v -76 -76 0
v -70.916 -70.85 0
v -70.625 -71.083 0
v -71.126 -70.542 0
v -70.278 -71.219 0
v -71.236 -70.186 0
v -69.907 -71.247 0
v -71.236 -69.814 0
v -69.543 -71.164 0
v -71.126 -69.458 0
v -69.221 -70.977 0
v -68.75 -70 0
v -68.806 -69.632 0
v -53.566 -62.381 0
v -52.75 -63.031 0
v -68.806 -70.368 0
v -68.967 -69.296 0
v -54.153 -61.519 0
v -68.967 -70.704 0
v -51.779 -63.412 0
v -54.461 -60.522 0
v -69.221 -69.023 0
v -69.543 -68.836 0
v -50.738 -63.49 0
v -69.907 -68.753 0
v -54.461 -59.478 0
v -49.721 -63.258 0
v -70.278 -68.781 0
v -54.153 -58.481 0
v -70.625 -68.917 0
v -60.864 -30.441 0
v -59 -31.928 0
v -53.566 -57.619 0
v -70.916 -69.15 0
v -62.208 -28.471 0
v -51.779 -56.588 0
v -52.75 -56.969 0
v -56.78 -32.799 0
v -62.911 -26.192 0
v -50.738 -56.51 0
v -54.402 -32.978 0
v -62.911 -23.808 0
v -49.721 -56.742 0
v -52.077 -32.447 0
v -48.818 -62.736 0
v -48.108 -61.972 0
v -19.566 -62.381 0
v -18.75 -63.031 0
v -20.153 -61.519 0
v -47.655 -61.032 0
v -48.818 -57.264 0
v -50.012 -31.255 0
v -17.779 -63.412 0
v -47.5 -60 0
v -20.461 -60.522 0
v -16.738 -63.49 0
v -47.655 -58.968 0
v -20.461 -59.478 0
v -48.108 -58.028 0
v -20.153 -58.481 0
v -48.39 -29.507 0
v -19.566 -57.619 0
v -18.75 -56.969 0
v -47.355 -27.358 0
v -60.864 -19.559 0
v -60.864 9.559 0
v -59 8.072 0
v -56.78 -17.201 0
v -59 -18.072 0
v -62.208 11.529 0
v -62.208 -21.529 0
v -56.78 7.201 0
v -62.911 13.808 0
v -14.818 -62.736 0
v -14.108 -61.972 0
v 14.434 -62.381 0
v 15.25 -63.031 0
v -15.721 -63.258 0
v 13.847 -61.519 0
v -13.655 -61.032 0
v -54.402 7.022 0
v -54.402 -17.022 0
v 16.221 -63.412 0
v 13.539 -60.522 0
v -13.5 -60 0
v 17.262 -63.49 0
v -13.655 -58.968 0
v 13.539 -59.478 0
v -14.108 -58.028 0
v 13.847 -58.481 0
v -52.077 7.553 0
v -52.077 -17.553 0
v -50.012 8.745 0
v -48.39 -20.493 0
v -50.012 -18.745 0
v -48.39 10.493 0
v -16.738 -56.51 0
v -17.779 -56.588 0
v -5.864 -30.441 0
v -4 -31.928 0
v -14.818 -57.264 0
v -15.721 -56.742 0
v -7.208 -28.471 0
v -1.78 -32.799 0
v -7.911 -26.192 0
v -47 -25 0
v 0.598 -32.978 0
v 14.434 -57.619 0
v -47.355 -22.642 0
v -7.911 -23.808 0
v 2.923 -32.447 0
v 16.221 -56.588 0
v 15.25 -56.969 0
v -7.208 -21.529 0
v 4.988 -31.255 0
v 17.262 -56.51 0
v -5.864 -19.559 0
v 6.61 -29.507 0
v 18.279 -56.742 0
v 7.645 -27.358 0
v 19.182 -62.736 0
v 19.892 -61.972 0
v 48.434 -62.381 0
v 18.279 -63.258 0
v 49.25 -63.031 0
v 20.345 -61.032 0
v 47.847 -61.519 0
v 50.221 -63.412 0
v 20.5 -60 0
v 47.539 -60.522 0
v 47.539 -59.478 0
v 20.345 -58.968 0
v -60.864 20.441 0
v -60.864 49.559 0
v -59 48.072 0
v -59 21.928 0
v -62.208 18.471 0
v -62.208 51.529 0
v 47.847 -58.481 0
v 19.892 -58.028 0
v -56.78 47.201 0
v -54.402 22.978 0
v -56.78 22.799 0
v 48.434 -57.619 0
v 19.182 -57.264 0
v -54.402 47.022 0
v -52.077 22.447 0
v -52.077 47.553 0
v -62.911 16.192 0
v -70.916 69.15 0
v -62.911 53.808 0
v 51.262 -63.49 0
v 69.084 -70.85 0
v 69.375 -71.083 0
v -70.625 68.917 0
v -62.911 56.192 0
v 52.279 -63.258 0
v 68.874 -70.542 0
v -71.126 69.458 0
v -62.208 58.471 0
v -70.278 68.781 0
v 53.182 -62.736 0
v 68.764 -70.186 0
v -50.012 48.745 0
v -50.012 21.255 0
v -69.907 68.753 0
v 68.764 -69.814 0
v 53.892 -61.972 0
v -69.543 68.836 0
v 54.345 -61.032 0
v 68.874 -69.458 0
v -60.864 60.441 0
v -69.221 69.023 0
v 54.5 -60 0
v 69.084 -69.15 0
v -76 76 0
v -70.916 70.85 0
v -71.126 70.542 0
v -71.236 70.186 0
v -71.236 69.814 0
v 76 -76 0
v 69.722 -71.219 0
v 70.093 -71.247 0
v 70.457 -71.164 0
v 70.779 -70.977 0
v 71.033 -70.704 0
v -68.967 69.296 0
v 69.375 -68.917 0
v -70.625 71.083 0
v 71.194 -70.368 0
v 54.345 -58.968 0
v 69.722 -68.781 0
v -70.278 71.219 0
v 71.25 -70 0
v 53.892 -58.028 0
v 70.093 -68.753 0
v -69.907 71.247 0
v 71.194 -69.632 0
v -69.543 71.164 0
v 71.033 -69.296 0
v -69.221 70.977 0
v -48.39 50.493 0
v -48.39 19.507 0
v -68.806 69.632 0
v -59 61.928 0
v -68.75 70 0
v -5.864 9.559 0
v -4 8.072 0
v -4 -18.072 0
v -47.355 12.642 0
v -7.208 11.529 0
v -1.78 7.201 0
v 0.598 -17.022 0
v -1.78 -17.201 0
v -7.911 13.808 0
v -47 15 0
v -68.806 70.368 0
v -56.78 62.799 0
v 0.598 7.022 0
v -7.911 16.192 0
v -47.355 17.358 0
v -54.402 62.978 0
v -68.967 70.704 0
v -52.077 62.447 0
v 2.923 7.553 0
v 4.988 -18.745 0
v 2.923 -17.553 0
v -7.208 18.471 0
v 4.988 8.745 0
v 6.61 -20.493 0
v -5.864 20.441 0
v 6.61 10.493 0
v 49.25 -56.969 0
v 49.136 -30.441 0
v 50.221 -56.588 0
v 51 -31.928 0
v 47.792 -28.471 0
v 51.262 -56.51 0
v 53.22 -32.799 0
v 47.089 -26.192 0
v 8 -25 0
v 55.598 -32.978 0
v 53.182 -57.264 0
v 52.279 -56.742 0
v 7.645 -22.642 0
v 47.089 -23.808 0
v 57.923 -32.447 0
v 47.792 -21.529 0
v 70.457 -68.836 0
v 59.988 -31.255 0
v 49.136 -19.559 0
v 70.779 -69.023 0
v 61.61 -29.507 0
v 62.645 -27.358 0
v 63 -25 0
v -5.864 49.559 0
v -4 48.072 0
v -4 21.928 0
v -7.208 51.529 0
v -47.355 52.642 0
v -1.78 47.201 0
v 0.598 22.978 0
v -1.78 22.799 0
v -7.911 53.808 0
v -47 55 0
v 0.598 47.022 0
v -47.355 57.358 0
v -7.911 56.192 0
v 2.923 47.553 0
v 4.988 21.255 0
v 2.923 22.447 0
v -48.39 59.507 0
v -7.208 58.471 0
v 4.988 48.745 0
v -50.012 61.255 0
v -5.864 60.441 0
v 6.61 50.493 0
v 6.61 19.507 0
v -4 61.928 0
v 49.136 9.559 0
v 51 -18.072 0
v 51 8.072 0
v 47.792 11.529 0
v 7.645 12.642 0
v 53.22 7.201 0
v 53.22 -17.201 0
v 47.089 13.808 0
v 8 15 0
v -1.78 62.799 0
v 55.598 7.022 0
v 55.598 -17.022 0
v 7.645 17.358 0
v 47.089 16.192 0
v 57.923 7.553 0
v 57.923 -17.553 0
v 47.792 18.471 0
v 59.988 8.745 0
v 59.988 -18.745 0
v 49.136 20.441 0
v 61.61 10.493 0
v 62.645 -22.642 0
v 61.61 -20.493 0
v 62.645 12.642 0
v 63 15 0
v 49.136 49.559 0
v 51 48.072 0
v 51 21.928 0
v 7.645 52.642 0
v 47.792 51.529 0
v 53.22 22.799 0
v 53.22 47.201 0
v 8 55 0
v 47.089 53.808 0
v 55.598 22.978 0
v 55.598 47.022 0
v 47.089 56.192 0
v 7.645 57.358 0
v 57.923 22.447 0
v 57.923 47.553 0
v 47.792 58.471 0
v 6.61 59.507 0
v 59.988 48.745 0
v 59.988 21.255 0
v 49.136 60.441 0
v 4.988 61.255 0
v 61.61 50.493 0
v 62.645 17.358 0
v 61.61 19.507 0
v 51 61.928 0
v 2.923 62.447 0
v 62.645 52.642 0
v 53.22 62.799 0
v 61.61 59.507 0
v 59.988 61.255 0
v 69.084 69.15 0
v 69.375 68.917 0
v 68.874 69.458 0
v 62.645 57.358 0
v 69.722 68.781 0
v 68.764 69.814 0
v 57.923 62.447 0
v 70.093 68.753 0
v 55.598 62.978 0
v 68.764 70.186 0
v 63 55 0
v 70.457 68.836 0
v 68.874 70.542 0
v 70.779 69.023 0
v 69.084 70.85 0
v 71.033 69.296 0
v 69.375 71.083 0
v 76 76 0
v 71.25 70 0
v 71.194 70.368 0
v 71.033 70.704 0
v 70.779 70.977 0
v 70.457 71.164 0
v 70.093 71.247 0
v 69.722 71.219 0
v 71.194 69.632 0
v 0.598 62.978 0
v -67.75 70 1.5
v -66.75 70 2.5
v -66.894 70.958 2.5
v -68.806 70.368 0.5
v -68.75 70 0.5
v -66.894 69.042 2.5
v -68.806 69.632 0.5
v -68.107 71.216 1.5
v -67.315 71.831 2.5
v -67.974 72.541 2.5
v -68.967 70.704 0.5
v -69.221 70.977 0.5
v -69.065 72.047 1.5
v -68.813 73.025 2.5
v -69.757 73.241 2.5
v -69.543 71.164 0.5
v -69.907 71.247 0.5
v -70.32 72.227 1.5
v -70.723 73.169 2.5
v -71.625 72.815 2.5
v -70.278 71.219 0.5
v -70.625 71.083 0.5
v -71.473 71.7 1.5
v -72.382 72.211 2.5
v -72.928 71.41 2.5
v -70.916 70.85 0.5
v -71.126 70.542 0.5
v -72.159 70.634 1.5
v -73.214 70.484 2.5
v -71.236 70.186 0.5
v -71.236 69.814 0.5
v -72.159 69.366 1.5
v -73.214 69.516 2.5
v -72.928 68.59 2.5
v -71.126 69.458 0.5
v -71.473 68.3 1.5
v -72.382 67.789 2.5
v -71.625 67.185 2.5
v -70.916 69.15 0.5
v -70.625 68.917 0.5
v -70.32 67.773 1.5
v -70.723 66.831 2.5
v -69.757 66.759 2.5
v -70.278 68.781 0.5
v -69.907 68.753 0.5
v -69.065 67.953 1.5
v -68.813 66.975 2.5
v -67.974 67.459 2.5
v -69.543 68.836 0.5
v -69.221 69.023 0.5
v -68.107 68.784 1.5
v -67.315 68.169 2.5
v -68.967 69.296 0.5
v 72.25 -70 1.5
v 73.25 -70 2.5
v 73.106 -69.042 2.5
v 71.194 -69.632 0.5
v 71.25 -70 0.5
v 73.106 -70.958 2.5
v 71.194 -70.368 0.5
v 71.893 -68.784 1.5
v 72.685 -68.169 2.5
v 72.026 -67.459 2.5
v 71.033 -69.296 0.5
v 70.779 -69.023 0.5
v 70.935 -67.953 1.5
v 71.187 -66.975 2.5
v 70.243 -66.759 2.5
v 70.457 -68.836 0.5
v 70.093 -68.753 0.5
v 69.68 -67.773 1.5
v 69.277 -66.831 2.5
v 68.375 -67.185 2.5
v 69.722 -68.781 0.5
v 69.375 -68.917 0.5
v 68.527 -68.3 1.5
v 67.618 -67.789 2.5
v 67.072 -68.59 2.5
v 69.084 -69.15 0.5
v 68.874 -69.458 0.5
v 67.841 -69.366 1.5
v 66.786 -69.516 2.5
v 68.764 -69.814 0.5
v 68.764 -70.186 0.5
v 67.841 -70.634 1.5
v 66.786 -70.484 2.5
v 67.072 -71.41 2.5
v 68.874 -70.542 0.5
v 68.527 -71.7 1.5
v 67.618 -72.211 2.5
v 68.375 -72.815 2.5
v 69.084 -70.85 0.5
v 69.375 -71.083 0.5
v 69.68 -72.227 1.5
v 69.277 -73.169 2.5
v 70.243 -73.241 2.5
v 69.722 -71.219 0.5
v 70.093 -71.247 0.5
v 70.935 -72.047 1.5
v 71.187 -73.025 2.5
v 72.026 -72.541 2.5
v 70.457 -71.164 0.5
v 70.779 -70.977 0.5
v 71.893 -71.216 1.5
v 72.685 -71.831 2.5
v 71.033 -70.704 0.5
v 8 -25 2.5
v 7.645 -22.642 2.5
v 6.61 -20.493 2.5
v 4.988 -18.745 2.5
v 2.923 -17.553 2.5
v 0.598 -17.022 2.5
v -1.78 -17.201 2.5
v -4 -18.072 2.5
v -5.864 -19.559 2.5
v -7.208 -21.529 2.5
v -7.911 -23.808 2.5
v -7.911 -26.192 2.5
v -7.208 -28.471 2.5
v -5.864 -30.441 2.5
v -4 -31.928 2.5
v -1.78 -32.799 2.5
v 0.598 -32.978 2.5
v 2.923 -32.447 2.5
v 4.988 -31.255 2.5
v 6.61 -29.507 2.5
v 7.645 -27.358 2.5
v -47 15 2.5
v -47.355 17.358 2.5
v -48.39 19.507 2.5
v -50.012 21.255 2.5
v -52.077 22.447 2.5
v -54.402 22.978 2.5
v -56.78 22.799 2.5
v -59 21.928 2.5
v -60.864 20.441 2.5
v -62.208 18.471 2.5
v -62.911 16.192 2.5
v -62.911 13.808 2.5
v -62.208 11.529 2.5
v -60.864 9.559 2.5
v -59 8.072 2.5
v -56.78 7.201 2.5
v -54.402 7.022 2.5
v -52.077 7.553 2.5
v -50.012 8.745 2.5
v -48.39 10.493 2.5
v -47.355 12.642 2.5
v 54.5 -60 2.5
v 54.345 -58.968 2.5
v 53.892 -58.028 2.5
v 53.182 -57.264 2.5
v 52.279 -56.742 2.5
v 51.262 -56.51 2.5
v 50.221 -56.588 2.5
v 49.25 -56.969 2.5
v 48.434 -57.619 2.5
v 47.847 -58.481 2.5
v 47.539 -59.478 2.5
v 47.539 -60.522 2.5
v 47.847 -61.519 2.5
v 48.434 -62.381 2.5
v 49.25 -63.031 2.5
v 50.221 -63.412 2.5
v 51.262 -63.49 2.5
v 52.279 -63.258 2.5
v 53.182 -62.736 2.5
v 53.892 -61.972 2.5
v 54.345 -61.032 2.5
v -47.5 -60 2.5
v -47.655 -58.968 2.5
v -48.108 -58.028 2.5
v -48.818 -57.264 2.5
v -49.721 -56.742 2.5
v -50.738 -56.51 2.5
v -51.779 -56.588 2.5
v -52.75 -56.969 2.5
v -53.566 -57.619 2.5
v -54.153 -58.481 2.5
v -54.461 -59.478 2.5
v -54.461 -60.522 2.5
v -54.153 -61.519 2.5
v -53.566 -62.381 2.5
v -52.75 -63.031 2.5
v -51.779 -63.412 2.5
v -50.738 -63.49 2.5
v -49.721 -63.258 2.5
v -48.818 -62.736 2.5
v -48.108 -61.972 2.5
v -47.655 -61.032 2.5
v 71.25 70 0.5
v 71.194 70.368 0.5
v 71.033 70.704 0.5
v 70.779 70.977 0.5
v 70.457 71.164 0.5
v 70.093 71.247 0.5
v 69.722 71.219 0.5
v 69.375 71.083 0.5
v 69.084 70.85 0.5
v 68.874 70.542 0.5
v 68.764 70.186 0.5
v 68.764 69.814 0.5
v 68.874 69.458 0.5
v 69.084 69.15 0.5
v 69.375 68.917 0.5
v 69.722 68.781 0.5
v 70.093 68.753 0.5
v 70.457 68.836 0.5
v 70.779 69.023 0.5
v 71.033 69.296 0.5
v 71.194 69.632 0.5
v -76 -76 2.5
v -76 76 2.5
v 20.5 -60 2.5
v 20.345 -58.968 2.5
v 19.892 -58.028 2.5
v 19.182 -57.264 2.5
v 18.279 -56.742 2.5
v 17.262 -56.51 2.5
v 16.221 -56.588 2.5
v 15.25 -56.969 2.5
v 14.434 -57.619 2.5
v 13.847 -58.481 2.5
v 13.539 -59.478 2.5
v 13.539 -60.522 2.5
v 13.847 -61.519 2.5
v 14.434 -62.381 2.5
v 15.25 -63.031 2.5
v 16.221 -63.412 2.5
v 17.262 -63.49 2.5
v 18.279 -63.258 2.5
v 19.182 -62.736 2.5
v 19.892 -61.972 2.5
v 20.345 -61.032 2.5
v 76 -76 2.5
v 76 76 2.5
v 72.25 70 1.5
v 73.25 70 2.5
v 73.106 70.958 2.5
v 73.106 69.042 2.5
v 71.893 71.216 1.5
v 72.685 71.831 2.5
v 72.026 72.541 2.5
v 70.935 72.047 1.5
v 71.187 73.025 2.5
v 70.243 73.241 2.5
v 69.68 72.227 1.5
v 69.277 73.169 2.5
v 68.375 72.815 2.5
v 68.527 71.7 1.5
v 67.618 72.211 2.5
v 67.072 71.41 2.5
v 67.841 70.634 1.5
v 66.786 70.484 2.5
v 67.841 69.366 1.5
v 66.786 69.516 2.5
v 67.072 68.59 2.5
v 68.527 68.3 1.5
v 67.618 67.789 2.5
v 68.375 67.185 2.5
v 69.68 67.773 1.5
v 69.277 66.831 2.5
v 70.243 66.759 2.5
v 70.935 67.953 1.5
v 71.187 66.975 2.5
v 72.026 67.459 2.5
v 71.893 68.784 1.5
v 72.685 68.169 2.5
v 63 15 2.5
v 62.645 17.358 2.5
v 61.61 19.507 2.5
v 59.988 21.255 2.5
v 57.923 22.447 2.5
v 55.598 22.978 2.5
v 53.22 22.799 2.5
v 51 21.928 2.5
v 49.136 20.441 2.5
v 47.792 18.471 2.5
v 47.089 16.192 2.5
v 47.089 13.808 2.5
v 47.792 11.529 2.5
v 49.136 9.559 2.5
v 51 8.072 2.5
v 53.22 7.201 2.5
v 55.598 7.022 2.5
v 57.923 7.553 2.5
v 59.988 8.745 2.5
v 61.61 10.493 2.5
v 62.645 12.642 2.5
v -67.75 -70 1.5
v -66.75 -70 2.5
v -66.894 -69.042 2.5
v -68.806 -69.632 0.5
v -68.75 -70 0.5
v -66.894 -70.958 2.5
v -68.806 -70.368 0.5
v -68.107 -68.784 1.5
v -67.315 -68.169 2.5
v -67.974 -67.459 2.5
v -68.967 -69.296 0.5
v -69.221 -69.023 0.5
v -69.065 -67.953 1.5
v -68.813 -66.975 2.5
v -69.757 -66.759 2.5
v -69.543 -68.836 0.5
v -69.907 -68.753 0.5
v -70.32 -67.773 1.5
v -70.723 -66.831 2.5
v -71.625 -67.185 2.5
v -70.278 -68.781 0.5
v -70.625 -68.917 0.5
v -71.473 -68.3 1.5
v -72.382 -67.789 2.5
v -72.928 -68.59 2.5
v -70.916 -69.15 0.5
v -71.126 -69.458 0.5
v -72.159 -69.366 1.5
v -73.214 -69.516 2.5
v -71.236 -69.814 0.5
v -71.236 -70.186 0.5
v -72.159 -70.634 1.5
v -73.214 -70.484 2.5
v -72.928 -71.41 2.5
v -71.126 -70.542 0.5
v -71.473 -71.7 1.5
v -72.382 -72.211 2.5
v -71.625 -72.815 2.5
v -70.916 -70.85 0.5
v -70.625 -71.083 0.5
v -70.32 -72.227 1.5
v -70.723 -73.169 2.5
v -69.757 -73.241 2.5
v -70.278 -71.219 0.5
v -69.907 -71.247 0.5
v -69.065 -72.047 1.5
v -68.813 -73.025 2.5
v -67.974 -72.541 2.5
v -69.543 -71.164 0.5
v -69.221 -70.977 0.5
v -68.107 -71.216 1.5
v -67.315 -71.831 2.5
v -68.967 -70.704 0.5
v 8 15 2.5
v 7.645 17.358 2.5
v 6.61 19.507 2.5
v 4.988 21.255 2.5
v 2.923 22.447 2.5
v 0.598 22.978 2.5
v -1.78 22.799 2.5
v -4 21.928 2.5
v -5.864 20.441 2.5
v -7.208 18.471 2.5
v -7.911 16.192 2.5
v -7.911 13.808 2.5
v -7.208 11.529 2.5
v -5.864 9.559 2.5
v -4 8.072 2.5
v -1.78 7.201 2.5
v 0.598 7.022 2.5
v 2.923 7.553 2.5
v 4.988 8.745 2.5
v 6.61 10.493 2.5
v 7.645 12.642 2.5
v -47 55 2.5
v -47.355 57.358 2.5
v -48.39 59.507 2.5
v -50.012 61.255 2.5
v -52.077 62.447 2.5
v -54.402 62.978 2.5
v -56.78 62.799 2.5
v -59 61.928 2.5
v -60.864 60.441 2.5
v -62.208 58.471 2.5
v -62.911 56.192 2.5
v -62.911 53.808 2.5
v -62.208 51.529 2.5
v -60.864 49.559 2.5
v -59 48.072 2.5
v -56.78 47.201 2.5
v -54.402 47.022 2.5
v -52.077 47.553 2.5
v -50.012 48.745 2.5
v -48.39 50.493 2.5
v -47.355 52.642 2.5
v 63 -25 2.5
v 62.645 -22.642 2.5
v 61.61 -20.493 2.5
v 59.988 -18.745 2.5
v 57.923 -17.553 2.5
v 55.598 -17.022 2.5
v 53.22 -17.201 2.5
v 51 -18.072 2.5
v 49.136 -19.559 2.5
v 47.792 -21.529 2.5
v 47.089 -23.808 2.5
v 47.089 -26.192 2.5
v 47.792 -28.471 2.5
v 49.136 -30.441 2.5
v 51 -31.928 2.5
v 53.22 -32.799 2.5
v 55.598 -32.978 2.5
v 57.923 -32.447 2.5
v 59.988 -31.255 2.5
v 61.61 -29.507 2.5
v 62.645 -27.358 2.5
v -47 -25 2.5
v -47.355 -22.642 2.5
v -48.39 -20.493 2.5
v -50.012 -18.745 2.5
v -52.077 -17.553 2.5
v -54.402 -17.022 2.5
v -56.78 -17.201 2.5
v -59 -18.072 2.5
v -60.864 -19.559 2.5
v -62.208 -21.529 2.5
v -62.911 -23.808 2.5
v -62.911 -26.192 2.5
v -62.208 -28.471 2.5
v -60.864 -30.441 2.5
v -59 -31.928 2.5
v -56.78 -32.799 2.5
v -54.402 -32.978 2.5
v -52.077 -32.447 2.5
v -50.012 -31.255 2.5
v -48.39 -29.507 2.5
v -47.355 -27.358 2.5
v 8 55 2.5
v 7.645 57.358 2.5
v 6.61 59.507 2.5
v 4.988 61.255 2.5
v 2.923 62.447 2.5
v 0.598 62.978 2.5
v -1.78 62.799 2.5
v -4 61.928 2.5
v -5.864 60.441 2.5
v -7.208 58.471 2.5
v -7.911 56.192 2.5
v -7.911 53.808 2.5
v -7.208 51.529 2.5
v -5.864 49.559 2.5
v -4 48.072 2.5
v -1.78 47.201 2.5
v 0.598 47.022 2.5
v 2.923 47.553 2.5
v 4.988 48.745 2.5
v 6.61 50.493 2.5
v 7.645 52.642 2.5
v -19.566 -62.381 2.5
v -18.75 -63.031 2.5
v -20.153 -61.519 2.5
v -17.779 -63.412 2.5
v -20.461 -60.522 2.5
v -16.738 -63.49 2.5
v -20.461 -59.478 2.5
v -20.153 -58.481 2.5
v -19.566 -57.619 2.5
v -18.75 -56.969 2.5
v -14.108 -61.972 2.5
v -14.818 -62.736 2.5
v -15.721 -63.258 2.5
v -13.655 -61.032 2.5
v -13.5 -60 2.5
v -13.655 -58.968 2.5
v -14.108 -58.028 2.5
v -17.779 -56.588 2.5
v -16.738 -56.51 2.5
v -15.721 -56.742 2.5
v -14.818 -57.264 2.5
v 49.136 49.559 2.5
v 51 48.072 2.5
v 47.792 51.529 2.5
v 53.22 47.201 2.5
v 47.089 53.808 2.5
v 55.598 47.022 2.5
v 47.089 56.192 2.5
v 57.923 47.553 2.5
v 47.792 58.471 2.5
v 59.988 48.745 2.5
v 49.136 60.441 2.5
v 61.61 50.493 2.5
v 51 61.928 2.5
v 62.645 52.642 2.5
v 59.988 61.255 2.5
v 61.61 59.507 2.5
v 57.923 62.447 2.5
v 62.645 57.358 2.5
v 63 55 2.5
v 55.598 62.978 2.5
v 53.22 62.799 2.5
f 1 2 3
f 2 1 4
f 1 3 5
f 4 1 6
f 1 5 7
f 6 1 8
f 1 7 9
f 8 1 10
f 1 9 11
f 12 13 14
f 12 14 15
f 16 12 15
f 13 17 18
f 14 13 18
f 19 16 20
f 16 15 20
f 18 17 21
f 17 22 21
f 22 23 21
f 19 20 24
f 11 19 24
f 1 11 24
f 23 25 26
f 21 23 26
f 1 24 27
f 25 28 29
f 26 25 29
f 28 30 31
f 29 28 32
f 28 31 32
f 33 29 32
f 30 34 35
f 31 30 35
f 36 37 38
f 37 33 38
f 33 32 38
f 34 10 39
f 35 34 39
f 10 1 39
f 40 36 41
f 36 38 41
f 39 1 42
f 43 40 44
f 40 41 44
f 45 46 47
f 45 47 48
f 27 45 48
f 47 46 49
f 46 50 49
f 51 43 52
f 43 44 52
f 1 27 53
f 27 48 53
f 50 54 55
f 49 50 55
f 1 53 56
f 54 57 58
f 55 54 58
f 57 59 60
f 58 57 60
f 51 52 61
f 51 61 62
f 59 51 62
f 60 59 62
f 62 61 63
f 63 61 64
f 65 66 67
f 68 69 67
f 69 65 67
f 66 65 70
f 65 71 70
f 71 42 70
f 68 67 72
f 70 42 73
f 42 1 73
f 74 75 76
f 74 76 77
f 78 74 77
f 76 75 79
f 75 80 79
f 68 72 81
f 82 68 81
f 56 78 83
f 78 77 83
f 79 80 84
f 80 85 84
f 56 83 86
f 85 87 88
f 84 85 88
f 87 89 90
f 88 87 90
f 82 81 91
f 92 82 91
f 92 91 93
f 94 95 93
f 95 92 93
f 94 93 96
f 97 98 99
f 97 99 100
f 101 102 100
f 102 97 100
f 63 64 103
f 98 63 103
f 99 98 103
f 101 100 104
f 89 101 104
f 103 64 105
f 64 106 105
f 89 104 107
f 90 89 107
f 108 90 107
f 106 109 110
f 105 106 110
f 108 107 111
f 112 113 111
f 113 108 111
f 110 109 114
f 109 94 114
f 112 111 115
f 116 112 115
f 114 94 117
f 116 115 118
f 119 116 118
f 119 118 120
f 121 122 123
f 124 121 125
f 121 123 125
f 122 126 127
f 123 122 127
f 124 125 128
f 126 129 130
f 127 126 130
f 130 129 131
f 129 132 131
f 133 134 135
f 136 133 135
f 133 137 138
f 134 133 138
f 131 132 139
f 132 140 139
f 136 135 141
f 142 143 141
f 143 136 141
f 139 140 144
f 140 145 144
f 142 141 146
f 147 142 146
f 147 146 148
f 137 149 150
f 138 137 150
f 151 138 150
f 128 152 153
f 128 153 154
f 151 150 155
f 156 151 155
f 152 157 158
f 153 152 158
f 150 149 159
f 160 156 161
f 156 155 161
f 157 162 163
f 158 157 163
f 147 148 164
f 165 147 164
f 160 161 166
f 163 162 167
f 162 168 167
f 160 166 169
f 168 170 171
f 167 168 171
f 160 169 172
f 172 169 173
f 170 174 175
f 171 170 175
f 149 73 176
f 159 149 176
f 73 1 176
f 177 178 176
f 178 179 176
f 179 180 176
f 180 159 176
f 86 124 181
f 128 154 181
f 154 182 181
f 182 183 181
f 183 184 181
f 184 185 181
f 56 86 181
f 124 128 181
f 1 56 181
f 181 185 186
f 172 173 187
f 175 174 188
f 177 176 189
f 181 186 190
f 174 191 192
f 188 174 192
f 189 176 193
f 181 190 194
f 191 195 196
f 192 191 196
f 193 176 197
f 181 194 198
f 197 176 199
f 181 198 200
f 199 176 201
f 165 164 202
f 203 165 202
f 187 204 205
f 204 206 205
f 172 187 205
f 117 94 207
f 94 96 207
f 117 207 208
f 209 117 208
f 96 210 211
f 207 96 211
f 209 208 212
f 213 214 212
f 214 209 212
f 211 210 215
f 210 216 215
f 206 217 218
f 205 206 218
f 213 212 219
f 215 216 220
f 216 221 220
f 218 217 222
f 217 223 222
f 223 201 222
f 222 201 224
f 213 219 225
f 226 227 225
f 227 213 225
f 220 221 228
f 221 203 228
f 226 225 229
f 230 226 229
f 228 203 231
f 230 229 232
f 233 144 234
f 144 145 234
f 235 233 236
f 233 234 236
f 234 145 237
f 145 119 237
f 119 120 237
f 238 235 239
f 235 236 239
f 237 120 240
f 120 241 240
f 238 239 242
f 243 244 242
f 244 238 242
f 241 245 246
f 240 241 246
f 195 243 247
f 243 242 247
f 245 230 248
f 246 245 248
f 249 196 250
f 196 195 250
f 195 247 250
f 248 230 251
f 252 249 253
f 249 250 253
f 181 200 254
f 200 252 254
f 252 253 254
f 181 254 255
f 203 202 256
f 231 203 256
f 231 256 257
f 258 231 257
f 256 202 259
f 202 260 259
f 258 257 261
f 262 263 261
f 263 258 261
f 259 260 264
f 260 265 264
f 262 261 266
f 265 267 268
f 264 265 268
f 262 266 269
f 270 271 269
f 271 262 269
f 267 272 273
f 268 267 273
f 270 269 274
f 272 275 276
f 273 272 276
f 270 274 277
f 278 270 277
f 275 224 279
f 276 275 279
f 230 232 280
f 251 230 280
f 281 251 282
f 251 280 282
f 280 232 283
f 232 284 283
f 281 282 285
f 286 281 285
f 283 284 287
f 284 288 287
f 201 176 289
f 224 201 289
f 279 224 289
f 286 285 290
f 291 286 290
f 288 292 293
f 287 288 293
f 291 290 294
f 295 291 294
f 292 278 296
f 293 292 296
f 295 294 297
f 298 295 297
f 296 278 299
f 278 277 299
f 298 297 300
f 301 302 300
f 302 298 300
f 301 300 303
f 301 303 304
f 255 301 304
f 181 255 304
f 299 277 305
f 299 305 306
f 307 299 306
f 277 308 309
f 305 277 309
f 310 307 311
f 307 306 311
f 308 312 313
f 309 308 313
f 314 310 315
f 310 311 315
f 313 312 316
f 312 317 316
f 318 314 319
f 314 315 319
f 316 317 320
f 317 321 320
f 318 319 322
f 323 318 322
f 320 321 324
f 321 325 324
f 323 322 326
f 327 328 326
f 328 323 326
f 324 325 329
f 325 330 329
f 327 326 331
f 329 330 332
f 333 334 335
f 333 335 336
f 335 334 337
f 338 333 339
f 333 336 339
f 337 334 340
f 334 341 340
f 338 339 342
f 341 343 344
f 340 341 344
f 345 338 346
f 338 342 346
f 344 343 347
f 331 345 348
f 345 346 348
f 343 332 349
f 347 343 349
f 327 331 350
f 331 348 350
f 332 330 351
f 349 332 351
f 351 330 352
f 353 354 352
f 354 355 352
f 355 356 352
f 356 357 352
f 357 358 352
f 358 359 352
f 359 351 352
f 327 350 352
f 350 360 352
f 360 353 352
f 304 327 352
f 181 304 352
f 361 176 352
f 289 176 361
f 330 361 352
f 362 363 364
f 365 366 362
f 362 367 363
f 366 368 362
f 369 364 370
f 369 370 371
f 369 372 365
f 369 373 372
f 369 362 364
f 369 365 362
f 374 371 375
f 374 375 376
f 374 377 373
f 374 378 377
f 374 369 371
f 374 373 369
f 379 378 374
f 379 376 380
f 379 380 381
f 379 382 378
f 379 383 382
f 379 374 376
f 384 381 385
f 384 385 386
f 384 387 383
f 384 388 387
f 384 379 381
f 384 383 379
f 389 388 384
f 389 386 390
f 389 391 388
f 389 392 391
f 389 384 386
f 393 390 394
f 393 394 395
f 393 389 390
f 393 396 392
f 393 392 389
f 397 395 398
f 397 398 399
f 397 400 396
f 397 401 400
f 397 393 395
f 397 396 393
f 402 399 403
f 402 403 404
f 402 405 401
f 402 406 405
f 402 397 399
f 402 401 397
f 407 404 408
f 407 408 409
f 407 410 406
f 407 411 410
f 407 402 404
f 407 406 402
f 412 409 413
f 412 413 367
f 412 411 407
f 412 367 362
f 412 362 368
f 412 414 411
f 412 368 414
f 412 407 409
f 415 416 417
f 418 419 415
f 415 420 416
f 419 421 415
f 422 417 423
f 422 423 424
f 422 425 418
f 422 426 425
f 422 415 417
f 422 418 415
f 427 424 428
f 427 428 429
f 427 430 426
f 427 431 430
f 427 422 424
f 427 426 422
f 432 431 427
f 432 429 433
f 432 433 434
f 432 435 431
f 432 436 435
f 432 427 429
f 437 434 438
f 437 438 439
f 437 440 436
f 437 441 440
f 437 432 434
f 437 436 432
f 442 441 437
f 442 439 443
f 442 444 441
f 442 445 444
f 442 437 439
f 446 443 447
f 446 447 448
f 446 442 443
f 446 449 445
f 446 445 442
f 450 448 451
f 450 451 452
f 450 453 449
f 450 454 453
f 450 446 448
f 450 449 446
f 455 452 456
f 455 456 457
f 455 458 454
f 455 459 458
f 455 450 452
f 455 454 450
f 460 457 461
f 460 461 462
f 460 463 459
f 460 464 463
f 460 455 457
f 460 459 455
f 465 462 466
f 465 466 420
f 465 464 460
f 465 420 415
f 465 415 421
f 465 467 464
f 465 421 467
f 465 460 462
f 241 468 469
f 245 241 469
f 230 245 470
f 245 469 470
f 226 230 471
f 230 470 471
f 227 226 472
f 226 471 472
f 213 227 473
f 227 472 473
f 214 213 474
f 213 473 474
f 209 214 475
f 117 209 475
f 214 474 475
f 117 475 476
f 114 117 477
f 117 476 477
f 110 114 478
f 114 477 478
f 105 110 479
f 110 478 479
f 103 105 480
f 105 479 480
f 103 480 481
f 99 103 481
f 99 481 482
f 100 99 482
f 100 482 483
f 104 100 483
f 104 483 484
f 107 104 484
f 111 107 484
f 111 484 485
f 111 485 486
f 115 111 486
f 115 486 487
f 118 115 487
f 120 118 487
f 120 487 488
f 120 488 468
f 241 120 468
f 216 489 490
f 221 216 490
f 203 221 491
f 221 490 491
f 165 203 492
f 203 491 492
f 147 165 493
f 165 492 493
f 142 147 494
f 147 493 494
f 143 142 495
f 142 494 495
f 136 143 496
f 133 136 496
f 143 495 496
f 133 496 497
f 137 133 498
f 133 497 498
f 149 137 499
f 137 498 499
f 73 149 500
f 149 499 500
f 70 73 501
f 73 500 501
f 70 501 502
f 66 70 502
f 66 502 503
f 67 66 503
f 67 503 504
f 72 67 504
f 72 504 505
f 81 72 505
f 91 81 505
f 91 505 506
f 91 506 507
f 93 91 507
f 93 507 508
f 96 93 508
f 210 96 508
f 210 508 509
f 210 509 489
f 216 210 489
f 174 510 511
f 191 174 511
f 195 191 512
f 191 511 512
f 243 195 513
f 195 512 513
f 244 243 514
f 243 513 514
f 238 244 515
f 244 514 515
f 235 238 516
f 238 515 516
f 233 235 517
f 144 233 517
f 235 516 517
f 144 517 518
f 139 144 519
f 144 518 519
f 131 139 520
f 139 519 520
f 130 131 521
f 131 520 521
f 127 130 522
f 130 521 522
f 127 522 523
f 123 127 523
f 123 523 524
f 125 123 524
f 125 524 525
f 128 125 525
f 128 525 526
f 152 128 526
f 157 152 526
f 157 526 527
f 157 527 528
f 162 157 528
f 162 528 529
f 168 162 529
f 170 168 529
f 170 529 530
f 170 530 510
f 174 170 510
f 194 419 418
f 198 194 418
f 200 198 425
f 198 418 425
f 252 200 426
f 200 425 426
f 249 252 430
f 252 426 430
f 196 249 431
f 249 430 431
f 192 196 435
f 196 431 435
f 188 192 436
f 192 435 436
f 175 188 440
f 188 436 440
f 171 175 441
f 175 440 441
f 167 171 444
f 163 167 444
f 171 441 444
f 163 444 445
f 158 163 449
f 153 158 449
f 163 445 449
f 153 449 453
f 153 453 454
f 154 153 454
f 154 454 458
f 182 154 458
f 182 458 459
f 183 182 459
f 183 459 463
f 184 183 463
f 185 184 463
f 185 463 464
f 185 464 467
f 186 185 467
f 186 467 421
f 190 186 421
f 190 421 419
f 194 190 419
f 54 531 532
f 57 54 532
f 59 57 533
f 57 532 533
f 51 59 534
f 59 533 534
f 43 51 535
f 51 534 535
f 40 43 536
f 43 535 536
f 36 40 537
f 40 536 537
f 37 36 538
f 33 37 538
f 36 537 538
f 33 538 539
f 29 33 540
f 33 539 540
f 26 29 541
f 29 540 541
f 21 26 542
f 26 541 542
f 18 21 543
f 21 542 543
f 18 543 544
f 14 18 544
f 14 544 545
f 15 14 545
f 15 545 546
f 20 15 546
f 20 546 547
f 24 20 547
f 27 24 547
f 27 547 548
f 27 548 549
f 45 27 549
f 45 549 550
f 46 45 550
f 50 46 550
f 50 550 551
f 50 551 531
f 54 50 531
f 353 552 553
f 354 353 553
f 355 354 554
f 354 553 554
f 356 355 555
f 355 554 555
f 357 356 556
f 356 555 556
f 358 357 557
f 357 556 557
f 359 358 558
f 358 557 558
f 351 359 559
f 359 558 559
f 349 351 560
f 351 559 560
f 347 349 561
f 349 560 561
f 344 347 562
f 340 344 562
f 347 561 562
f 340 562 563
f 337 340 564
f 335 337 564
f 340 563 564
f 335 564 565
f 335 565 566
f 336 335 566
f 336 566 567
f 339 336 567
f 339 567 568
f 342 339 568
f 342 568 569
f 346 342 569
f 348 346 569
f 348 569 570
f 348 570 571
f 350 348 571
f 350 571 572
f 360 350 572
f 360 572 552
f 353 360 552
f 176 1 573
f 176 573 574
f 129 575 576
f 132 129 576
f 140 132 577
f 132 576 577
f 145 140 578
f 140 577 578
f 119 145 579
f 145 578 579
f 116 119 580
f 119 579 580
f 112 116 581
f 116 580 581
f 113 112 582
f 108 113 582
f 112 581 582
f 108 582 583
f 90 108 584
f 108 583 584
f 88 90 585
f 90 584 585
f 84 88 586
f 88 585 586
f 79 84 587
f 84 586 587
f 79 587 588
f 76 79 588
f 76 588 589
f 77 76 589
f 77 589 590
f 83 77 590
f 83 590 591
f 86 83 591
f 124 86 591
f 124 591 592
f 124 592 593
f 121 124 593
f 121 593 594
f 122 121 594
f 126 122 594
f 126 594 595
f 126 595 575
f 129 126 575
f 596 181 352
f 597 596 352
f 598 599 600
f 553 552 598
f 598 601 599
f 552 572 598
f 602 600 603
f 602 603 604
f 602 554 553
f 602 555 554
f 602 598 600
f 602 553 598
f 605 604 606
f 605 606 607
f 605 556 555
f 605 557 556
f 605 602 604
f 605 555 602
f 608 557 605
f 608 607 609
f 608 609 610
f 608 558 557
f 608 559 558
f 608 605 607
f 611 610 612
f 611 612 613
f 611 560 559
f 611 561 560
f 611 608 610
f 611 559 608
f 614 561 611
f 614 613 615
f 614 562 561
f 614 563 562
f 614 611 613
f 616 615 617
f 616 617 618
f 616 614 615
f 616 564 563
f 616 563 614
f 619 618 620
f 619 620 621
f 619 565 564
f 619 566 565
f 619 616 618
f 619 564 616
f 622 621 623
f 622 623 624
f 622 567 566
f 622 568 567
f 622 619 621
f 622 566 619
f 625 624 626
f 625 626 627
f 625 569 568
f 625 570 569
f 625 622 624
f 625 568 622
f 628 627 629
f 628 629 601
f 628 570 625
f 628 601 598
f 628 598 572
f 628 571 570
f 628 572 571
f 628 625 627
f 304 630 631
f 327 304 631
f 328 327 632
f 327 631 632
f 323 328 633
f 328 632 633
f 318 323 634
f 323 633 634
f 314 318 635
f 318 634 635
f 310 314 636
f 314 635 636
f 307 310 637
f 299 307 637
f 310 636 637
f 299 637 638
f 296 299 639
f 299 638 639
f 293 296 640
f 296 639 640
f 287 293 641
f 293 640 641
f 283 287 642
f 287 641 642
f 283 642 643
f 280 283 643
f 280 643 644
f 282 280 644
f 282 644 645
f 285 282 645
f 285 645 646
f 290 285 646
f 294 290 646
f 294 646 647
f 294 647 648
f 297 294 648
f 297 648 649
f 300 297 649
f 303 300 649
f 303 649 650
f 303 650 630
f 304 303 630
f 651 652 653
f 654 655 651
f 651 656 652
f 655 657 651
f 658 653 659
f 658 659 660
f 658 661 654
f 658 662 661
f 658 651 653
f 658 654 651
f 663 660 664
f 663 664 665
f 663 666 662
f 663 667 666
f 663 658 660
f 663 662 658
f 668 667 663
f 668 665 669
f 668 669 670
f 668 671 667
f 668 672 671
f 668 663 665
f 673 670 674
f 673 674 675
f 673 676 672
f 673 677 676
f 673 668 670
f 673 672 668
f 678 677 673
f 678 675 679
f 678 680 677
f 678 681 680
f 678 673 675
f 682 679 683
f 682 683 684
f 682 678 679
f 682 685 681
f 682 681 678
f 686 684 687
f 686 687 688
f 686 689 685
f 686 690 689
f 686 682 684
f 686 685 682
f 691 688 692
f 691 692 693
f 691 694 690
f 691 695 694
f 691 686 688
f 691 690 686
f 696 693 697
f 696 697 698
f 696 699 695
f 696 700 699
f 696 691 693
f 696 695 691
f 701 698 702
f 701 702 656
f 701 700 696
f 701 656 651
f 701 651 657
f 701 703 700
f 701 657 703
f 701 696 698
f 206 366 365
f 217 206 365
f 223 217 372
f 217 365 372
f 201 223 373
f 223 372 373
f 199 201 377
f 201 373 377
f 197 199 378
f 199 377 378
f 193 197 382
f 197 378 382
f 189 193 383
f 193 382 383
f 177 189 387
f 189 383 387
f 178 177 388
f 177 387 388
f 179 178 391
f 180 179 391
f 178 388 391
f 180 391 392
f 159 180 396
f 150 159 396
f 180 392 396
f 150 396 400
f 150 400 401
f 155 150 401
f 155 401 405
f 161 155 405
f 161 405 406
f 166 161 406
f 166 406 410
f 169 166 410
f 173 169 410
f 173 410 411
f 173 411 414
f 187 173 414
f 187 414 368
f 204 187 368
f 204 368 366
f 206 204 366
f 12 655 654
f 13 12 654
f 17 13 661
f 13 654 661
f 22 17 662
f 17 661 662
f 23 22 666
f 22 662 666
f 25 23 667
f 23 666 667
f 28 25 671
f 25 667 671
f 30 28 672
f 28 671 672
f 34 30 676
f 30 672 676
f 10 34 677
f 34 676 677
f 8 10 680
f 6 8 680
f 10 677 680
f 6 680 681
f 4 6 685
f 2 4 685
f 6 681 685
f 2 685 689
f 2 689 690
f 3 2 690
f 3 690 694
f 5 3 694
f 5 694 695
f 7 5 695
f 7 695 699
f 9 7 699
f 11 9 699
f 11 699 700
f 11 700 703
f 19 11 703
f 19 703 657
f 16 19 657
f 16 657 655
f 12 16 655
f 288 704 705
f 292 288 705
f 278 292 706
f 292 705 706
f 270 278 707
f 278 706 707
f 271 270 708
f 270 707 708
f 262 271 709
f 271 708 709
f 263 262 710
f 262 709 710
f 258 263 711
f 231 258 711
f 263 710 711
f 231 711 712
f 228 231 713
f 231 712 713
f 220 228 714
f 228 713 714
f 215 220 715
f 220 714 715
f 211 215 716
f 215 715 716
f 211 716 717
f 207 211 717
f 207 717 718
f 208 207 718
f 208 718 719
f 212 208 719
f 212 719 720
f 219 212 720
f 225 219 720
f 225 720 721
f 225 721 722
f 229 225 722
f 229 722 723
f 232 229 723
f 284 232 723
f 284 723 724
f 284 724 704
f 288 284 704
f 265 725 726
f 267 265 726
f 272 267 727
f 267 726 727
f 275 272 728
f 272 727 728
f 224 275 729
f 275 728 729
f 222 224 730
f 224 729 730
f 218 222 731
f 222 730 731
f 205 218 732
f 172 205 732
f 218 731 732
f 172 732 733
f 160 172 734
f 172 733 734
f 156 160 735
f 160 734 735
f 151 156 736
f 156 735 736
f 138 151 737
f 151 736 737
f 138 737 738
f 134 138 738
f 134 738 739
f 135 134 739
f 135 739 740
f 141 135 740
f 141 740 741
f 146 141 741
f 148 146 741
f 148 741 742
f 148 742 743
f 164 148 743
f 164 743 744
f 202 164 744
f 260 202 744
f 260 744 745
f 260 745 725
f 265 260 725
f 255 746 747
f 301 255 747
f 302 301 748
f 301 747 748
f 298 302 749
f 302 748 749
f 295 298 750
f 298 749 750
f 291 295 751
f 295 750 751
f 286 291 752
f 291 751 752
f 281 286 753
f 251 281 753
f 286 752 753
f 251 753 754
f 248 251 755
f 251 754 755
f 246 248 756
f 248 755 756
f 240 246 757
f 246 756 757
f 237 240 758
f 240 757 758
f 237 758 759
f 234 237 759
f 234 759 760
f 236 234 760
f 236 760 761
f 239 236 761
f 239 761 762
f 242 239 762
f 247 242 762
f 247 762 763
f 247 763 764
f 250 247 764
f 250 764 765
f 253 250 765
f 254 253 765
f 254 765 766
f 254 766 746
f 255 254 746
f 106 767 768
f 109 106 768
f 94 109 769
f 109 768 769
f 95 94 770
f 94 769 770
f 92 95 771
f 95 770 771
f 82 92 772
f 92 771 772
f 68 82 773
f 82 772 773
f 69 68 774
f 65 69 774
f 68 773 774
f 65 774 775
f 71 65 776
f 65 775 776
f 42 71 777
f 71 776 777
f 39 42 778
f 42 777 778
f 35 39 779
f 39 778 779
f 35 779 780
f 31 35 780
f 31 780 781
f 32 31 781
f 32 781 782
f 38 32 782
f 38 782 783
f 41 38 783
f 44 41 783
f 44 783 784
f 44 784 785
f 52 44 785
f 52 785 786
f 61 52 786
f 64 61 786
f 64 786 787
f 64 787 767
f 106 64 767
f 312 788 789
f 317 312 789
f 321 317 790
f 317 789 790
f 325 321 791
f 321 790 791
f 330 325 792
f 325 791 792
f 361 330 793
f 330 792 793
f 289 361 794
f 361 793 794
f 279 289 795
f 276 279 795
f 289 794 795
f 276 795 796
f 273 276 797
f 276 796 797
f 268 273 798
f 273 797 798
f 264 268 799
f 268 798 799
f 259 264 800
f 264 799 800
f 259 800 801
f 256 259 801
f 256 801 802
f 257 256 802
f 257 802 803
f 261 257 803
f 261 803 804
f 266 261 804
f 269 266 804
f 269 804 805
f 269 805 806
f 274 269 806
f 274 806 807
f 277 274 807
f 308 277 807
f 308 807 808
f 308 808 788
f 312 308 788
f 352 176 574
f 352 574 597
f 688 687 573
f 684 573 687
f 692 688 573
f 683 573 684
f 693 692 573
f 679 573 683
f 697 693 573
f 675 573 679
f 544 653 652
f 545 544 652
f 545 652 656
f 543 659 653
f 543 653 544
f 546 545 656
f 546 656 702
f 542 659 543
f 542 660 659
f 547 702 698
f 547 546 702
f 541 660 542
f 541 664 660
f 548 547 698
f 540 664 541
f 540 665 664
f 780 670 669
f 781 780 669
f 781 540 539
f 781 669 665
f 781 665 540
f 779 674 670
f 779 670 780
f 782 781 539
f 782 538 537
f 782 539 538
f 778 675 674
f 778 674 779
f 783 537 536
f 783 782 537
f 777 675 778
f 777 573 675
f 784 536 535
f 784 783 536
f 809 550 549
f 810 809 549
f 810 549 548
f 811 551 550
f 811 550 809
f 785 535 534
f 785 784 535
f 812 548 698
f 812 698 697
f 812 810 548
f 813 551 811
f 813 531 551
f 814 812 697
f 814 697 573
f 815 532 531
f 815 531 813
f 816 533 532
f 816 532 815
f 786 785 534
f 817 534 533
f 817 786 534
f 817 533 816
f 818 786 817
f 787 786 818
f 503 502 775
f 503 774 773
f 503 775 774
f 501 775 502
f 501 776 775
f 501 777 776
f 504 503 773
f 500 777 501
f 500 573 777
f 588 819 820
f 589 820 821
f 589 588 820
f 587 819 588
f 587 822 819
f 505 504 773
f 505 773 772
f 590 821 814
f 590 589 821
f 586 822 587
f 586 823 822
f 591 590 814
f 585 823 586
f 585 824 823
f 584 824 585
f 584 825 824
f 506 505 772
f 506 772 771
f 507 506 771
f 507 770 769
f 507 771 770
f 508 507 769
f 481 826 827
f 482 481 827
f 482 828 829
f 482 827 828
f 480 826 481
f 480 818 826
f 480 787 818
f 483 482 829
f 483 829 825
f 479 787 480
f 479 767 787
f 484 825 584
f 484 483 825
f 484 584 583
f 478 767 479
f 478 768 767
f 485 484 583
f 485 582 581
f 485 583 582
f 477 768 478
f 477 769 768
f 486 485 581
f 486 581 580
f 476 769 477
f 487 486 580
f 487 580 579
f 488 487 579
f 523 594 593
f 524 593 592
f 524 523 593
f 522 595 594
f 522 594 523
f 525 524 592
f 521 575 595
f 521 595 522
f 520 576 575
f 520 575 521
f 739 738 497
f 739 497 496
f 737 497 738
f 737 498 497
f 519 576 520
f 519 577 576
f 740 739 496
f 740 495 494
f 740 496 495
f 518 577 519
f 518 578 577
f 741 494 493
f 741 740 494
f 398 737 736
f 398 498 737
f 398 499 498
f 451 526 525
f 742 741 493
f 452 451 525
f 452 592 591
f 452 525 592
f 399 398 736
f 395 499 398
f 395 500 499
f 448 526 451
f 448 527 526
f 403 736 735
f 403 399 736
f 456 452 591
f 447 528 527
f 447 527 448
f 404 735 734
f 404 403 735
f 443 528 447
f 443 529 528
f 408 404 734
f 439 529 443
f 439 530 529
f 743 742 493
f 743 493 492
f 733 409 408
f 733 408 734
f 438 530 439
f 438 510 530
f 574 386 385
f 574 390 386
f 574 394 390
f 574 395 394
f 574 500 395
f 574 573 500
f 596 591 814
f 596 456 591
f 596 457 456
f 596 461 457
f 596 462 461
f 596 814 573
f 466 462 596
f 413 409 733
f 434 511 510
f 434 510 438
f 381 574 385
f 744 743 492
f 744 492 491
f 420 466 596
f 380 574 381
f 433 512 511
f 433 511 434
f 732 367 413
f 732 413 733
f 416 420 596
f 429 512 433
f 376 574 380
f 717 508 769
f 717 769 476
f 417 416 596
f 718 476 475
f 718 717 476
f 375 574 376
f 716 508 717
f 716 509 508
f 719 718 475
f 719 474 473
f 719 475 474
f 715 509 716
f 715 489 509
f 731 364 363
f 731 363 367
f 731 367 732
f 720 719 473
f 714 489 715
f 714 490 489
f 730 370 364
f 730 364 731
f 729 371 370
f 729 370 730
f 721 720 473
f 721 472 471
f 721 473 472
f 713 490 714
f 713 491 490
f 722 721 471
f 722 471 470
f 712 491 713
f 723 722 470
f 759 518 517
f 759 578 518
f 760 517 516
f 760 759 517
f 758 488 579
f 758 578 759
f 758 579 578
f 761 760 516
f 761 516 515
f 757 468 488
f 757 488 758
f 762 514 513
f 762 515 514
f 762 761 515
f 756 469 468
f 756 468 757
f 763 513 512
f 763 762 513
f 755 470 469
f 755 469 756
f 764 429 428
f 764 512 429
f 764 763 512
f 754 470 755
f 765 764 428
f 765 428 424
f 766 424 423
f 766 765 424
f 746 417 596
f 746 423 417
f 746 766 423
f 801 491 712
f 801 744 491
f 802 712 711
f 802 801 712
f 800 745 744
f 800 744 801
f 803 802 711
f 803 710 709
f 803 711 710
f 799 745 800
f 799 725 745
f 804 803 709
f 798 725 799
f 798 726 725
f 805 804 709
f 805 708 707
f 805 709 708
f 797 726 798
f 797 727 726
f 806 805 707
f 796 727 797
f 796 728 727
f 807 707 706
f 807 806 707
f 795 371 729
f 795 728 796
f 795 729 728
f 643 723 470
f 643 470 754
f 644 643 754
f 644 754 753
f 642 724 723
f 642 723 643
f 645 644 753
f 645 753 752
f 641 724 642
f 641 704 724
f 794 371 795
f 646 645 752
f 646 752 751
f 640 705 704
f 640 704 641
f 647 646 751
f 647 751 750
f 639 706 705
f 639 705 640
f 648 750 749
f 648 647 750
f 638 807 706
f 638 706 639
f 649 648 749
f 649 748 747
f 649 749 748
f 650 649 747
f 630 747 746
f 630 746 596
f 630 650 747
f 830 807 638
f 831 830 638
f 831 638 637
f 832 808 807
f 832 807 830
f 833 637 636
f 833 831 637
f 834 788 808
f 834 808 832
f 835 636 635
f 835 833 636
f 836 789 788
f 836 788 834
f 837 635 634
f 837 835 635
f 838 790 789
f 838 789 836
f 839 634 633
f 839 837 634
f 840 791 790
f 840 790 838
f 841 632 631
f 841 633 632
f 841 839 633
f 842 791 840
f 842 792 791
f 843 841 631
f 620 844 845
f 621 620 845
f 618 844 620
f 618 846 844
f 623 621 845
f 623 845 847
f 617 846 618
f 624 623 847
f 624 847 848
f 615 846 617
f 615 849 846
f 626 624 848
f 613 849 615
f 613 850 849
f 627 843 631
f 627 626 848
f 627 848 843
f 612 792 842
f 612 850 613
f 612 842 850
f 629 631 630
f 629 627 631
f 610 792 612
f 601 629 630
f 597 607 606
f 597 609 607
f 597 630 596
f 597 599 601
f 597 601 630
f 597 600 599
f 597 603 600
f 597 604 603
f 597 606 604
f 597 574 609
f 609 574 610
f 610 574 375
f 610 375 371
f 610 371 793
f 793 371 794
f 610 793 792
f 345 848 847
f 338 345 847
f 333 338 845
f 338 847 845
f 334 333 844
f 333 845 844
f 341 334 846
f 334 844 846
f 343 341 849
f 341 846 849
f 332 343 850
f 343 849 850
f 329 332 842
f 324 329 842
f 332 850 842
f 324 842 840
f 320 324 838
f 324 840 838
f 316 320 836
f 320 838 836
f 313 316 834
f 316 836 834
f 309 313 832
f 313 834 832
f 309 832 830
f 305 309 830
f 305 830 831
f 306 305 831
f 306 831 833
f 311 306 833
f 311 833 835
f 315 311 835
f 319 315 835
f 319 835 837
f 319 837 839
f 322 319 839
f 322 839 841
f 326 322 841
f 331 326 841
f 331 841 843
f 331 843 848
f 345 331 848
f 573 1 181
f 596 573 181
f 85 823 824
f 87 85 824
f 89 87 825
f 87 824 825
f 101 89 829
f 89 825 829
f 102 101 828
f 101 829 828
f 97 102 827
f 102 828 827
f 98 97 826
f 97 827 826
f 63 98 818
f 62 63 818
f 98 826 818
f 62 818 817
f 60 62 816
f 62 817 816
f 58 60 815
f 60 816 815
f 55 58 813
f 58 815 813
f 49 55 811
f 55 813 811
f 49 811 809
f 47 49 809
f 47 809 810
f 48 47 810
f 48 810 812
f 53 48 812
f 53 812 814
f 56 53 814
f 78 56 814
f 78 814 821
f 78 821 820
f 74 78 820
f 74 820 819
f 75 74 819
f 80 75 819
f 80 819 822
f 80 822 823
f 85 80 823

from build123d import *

# Parameters (mm, degrees)
SKETCH_W        = 152
SKETCH_H        = 152
PAD_DEPTH       = 2.5
SKETCH001_R     = 8
SKETCH001_R_2   = 3.5
POCKET_DEPTH    = 5
SKETCH002_R     = 1.25
POCKET001_DEPTH = 5
CHAMFER_SIZE    = 2


with BuildPart() as part:
    # Sketch → Pad (new body)
    with BuildSketch(Plane.XY):
        Rectangle(SKETCH_W, SKETCH_H)
    extrude(amount=PAD_DEPTH)

    # Sketch001 → Pocket (cut)
    with BuildSketch(Plane.XY.offset(2.5)):
        with Locations((-55, 55)):
            Circle(SKETCH001_R)
        with Locations((-51, -60)):
            Circle(SKETCH001_R_2)
        with Locations((-55, 15)):
            Circle(SKETCH001_R)
        with Locations((0, 15)):
            Circle(SKETCH001_R)
        with Locations((0, -25)):
            Circle(SKETCH001_R)
        with Locations((0, 55)):
            Circle(SKETCH001_R)
        with Locations((-17, -60)):
            Circle(SKETCH001_R_2)
        with Locations((17, -60)):
            Circle(SKETCH001_R_2)
        with Locations((51, -60)):
            Circle(SKETCH001_R_2)
        with Locations((55, 55)):
            Circle(SKETCH001_R)
        with Locations((-55, -25)):
            Circle(SKETCH001_R)
        with Locations((55, -25)):
            Circle(SKETCH001_R)
        with Locations((55, 15)):
            Circle(SKETCH001_R)
    extrude(amount=-POCKET_DEPTH, mode=Mode.SUBTRACT)

    # Sketch002 → Pocket001 (cut)
    with BuildSketch(Plane.XY.offset(2.5)):
        with Locations((-70, 70)):
            Circle(SKETCH002_R)
        with Locations((70, 70)):
            Circle(SKETCH002_R)
        with Locations((70, -70)):
            Circle(SKETCH002_R)
        with Locations((-70, -70)):
            Circle(SKETCH002_R)
    extrude(amount=-POCKET001_DEPTH, mode=Mode.SUBTRACT)

    # Chamfer
    chamfer_edges = [part.edges().sort_by_distance(p)[0] for p in [
        (-71.25, 70, 2.5),
        (68.75, 70, 2.5),
        (68.75, -70, 2.5),
        (-71.25, -70, 2.5),
    ]]
    chamfer(chamfer_edges, length=CHAMFER_SIZE)


solid = part.part
